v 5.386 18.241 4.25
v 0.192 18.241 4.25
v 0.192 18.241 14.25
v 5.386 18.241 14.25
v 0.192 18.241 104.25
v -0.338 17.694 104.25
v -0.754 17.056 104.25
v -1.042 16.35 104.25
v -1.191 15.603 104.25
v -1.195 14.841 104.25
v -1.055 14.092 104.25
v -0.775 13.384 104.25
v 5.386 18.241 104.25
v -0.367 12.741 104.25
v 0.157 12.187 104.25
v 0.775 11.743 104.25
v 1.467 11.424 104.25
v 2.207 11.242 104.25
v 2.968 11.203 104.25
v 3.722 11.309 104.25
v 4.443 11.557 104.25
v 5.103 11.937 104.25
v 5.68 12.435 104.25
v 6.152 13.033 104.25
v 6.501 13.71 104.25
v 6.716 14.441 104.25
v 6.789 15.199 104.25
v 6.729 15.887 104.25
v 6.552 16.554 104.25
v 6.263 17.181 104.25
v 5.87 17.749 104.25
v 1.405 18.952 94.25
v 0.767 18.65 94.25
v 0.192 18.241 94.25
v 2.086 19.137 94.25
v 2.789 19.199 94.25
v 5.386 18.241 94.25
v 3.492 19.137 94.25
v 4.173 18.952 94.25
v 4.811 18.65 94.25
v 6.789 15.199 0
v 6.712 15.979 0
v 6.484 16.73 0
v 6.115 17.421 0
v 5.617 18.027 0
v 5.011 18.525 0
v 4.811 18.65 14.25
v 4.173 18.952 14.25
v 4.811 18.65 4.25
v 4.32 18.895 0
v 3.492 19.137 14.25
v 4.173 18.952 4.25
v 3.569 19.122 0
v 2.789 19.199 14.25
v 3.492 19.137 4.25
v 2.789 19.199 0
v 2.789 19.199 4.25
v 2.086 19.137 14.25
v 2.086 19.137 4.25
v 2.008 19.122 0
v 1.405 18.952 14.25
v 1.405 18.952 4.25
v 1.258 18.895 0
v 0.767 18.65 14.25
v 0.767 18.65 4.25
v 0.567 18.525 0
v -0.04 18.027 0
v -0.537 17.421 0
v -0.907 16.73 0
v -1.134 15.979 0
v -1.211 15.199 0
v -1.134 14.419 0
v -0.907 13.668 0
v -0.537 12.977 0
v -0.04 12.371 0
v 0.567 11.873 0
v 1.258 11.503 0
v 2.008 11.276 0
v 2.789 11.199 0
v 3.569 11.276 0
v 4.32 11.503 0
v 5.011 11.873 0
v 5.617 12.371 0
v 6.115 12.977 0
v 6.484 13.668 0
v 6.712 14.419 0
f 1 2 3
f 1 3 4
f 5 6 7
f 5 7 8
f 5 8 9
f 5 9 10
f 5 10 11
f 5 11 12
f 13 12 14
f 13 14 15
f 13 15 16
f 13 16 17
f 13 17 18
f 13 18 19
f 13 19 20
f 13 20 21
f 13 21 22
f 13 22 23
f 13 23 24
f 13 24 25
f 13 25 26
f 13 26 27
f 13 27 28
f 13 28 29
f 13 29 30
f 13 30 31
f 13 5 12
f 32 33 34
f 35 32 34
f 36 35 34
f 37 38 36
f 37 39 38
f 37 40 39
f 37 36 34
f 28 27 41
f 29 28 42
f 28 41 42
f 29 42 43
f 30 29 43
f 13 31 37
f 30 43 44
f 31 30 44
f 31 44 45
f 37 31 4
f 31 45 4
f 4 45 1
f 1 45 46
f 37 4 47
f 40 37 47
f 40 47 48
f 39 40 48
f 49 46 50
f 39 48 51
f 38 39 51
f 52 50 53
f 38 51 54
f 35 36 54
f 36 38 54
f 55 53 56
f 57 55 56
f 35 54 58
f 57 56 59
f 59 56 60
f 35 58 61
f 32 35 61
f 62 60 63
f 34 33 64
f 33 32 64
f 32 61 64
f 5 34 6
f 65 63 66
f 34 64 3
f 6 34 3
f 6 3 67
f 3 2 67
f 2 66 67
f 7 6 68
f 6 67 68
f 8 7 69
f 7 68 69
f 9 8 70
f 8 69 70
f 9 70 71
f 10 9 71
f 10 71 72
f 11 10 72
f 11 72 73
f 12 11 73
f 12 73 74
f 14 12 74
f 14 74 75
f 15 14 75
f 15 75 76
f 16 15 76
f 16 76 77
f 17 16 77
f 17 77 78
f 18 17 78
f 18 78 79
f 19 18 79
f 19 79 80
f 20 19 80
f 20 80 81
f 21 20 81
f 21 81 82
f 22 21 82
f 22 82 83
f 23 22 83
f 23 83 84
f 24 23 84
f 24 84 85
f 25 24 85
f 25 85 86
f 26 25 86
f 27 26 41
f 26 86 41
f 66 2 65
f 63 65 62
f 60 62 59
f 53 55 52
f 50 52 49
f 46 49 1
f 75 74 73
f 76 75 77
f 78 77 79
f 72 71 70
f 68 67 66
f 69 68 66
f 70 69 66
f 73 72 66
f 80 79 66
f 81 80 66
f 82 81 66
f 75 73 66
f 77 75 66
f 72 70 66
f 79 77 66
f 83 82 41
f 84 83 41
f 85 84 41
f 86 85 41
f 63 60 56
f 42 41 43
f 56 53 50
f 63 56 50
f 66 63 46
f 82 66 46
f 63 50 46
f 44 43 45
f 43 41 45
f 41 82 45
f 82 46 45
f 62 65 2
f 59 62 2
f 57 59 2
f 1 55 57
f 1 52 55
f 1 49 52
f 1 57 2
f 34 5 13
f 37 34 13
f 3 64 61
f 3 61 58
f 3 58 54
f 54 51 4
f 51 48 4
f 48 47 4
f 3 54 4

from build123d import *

# Parameters (mm, degrees)
SKETCH_1_R          = 4
EXTRUDE_1_DEPTH     = 104.25
CUT_EXTRUDE_1_DEPTH = 10


with BuildPart() as part:
    # 草图1 → 凸台-拉伸1 (new body)
    with BuildSketch(Plane.XY):
        with Locations((2.788805167, 15.198988159)):
            Circle(SKETCH_1_R)
    extrude(amount=EXTRUDE_1_DEPTH)

    # 草图2 → 切除-拉伸1 (cut)
    with BuildSketch(Plane.XY.offset(104.25)):
        Polygon((-1.211194833, 18.241175928), (6.788805167, 18.241175928), (6.788805167, 20.490551127), (-1.353486866, 20.490551127), (-1.451820208, 18.241175928), align=None)
    cut_extrude_1 = extrude(amount=-CUT_EXTRUDE_1_DEPTH, mode=Mode.SUBTRACT)

    # 镜向1: 切除-拉伸1 across plane
    add(cut_extrude_1.mirror(Plane.XY.offset(54.25)), mode=Mode.SUBTRACT)


solid = part.part
